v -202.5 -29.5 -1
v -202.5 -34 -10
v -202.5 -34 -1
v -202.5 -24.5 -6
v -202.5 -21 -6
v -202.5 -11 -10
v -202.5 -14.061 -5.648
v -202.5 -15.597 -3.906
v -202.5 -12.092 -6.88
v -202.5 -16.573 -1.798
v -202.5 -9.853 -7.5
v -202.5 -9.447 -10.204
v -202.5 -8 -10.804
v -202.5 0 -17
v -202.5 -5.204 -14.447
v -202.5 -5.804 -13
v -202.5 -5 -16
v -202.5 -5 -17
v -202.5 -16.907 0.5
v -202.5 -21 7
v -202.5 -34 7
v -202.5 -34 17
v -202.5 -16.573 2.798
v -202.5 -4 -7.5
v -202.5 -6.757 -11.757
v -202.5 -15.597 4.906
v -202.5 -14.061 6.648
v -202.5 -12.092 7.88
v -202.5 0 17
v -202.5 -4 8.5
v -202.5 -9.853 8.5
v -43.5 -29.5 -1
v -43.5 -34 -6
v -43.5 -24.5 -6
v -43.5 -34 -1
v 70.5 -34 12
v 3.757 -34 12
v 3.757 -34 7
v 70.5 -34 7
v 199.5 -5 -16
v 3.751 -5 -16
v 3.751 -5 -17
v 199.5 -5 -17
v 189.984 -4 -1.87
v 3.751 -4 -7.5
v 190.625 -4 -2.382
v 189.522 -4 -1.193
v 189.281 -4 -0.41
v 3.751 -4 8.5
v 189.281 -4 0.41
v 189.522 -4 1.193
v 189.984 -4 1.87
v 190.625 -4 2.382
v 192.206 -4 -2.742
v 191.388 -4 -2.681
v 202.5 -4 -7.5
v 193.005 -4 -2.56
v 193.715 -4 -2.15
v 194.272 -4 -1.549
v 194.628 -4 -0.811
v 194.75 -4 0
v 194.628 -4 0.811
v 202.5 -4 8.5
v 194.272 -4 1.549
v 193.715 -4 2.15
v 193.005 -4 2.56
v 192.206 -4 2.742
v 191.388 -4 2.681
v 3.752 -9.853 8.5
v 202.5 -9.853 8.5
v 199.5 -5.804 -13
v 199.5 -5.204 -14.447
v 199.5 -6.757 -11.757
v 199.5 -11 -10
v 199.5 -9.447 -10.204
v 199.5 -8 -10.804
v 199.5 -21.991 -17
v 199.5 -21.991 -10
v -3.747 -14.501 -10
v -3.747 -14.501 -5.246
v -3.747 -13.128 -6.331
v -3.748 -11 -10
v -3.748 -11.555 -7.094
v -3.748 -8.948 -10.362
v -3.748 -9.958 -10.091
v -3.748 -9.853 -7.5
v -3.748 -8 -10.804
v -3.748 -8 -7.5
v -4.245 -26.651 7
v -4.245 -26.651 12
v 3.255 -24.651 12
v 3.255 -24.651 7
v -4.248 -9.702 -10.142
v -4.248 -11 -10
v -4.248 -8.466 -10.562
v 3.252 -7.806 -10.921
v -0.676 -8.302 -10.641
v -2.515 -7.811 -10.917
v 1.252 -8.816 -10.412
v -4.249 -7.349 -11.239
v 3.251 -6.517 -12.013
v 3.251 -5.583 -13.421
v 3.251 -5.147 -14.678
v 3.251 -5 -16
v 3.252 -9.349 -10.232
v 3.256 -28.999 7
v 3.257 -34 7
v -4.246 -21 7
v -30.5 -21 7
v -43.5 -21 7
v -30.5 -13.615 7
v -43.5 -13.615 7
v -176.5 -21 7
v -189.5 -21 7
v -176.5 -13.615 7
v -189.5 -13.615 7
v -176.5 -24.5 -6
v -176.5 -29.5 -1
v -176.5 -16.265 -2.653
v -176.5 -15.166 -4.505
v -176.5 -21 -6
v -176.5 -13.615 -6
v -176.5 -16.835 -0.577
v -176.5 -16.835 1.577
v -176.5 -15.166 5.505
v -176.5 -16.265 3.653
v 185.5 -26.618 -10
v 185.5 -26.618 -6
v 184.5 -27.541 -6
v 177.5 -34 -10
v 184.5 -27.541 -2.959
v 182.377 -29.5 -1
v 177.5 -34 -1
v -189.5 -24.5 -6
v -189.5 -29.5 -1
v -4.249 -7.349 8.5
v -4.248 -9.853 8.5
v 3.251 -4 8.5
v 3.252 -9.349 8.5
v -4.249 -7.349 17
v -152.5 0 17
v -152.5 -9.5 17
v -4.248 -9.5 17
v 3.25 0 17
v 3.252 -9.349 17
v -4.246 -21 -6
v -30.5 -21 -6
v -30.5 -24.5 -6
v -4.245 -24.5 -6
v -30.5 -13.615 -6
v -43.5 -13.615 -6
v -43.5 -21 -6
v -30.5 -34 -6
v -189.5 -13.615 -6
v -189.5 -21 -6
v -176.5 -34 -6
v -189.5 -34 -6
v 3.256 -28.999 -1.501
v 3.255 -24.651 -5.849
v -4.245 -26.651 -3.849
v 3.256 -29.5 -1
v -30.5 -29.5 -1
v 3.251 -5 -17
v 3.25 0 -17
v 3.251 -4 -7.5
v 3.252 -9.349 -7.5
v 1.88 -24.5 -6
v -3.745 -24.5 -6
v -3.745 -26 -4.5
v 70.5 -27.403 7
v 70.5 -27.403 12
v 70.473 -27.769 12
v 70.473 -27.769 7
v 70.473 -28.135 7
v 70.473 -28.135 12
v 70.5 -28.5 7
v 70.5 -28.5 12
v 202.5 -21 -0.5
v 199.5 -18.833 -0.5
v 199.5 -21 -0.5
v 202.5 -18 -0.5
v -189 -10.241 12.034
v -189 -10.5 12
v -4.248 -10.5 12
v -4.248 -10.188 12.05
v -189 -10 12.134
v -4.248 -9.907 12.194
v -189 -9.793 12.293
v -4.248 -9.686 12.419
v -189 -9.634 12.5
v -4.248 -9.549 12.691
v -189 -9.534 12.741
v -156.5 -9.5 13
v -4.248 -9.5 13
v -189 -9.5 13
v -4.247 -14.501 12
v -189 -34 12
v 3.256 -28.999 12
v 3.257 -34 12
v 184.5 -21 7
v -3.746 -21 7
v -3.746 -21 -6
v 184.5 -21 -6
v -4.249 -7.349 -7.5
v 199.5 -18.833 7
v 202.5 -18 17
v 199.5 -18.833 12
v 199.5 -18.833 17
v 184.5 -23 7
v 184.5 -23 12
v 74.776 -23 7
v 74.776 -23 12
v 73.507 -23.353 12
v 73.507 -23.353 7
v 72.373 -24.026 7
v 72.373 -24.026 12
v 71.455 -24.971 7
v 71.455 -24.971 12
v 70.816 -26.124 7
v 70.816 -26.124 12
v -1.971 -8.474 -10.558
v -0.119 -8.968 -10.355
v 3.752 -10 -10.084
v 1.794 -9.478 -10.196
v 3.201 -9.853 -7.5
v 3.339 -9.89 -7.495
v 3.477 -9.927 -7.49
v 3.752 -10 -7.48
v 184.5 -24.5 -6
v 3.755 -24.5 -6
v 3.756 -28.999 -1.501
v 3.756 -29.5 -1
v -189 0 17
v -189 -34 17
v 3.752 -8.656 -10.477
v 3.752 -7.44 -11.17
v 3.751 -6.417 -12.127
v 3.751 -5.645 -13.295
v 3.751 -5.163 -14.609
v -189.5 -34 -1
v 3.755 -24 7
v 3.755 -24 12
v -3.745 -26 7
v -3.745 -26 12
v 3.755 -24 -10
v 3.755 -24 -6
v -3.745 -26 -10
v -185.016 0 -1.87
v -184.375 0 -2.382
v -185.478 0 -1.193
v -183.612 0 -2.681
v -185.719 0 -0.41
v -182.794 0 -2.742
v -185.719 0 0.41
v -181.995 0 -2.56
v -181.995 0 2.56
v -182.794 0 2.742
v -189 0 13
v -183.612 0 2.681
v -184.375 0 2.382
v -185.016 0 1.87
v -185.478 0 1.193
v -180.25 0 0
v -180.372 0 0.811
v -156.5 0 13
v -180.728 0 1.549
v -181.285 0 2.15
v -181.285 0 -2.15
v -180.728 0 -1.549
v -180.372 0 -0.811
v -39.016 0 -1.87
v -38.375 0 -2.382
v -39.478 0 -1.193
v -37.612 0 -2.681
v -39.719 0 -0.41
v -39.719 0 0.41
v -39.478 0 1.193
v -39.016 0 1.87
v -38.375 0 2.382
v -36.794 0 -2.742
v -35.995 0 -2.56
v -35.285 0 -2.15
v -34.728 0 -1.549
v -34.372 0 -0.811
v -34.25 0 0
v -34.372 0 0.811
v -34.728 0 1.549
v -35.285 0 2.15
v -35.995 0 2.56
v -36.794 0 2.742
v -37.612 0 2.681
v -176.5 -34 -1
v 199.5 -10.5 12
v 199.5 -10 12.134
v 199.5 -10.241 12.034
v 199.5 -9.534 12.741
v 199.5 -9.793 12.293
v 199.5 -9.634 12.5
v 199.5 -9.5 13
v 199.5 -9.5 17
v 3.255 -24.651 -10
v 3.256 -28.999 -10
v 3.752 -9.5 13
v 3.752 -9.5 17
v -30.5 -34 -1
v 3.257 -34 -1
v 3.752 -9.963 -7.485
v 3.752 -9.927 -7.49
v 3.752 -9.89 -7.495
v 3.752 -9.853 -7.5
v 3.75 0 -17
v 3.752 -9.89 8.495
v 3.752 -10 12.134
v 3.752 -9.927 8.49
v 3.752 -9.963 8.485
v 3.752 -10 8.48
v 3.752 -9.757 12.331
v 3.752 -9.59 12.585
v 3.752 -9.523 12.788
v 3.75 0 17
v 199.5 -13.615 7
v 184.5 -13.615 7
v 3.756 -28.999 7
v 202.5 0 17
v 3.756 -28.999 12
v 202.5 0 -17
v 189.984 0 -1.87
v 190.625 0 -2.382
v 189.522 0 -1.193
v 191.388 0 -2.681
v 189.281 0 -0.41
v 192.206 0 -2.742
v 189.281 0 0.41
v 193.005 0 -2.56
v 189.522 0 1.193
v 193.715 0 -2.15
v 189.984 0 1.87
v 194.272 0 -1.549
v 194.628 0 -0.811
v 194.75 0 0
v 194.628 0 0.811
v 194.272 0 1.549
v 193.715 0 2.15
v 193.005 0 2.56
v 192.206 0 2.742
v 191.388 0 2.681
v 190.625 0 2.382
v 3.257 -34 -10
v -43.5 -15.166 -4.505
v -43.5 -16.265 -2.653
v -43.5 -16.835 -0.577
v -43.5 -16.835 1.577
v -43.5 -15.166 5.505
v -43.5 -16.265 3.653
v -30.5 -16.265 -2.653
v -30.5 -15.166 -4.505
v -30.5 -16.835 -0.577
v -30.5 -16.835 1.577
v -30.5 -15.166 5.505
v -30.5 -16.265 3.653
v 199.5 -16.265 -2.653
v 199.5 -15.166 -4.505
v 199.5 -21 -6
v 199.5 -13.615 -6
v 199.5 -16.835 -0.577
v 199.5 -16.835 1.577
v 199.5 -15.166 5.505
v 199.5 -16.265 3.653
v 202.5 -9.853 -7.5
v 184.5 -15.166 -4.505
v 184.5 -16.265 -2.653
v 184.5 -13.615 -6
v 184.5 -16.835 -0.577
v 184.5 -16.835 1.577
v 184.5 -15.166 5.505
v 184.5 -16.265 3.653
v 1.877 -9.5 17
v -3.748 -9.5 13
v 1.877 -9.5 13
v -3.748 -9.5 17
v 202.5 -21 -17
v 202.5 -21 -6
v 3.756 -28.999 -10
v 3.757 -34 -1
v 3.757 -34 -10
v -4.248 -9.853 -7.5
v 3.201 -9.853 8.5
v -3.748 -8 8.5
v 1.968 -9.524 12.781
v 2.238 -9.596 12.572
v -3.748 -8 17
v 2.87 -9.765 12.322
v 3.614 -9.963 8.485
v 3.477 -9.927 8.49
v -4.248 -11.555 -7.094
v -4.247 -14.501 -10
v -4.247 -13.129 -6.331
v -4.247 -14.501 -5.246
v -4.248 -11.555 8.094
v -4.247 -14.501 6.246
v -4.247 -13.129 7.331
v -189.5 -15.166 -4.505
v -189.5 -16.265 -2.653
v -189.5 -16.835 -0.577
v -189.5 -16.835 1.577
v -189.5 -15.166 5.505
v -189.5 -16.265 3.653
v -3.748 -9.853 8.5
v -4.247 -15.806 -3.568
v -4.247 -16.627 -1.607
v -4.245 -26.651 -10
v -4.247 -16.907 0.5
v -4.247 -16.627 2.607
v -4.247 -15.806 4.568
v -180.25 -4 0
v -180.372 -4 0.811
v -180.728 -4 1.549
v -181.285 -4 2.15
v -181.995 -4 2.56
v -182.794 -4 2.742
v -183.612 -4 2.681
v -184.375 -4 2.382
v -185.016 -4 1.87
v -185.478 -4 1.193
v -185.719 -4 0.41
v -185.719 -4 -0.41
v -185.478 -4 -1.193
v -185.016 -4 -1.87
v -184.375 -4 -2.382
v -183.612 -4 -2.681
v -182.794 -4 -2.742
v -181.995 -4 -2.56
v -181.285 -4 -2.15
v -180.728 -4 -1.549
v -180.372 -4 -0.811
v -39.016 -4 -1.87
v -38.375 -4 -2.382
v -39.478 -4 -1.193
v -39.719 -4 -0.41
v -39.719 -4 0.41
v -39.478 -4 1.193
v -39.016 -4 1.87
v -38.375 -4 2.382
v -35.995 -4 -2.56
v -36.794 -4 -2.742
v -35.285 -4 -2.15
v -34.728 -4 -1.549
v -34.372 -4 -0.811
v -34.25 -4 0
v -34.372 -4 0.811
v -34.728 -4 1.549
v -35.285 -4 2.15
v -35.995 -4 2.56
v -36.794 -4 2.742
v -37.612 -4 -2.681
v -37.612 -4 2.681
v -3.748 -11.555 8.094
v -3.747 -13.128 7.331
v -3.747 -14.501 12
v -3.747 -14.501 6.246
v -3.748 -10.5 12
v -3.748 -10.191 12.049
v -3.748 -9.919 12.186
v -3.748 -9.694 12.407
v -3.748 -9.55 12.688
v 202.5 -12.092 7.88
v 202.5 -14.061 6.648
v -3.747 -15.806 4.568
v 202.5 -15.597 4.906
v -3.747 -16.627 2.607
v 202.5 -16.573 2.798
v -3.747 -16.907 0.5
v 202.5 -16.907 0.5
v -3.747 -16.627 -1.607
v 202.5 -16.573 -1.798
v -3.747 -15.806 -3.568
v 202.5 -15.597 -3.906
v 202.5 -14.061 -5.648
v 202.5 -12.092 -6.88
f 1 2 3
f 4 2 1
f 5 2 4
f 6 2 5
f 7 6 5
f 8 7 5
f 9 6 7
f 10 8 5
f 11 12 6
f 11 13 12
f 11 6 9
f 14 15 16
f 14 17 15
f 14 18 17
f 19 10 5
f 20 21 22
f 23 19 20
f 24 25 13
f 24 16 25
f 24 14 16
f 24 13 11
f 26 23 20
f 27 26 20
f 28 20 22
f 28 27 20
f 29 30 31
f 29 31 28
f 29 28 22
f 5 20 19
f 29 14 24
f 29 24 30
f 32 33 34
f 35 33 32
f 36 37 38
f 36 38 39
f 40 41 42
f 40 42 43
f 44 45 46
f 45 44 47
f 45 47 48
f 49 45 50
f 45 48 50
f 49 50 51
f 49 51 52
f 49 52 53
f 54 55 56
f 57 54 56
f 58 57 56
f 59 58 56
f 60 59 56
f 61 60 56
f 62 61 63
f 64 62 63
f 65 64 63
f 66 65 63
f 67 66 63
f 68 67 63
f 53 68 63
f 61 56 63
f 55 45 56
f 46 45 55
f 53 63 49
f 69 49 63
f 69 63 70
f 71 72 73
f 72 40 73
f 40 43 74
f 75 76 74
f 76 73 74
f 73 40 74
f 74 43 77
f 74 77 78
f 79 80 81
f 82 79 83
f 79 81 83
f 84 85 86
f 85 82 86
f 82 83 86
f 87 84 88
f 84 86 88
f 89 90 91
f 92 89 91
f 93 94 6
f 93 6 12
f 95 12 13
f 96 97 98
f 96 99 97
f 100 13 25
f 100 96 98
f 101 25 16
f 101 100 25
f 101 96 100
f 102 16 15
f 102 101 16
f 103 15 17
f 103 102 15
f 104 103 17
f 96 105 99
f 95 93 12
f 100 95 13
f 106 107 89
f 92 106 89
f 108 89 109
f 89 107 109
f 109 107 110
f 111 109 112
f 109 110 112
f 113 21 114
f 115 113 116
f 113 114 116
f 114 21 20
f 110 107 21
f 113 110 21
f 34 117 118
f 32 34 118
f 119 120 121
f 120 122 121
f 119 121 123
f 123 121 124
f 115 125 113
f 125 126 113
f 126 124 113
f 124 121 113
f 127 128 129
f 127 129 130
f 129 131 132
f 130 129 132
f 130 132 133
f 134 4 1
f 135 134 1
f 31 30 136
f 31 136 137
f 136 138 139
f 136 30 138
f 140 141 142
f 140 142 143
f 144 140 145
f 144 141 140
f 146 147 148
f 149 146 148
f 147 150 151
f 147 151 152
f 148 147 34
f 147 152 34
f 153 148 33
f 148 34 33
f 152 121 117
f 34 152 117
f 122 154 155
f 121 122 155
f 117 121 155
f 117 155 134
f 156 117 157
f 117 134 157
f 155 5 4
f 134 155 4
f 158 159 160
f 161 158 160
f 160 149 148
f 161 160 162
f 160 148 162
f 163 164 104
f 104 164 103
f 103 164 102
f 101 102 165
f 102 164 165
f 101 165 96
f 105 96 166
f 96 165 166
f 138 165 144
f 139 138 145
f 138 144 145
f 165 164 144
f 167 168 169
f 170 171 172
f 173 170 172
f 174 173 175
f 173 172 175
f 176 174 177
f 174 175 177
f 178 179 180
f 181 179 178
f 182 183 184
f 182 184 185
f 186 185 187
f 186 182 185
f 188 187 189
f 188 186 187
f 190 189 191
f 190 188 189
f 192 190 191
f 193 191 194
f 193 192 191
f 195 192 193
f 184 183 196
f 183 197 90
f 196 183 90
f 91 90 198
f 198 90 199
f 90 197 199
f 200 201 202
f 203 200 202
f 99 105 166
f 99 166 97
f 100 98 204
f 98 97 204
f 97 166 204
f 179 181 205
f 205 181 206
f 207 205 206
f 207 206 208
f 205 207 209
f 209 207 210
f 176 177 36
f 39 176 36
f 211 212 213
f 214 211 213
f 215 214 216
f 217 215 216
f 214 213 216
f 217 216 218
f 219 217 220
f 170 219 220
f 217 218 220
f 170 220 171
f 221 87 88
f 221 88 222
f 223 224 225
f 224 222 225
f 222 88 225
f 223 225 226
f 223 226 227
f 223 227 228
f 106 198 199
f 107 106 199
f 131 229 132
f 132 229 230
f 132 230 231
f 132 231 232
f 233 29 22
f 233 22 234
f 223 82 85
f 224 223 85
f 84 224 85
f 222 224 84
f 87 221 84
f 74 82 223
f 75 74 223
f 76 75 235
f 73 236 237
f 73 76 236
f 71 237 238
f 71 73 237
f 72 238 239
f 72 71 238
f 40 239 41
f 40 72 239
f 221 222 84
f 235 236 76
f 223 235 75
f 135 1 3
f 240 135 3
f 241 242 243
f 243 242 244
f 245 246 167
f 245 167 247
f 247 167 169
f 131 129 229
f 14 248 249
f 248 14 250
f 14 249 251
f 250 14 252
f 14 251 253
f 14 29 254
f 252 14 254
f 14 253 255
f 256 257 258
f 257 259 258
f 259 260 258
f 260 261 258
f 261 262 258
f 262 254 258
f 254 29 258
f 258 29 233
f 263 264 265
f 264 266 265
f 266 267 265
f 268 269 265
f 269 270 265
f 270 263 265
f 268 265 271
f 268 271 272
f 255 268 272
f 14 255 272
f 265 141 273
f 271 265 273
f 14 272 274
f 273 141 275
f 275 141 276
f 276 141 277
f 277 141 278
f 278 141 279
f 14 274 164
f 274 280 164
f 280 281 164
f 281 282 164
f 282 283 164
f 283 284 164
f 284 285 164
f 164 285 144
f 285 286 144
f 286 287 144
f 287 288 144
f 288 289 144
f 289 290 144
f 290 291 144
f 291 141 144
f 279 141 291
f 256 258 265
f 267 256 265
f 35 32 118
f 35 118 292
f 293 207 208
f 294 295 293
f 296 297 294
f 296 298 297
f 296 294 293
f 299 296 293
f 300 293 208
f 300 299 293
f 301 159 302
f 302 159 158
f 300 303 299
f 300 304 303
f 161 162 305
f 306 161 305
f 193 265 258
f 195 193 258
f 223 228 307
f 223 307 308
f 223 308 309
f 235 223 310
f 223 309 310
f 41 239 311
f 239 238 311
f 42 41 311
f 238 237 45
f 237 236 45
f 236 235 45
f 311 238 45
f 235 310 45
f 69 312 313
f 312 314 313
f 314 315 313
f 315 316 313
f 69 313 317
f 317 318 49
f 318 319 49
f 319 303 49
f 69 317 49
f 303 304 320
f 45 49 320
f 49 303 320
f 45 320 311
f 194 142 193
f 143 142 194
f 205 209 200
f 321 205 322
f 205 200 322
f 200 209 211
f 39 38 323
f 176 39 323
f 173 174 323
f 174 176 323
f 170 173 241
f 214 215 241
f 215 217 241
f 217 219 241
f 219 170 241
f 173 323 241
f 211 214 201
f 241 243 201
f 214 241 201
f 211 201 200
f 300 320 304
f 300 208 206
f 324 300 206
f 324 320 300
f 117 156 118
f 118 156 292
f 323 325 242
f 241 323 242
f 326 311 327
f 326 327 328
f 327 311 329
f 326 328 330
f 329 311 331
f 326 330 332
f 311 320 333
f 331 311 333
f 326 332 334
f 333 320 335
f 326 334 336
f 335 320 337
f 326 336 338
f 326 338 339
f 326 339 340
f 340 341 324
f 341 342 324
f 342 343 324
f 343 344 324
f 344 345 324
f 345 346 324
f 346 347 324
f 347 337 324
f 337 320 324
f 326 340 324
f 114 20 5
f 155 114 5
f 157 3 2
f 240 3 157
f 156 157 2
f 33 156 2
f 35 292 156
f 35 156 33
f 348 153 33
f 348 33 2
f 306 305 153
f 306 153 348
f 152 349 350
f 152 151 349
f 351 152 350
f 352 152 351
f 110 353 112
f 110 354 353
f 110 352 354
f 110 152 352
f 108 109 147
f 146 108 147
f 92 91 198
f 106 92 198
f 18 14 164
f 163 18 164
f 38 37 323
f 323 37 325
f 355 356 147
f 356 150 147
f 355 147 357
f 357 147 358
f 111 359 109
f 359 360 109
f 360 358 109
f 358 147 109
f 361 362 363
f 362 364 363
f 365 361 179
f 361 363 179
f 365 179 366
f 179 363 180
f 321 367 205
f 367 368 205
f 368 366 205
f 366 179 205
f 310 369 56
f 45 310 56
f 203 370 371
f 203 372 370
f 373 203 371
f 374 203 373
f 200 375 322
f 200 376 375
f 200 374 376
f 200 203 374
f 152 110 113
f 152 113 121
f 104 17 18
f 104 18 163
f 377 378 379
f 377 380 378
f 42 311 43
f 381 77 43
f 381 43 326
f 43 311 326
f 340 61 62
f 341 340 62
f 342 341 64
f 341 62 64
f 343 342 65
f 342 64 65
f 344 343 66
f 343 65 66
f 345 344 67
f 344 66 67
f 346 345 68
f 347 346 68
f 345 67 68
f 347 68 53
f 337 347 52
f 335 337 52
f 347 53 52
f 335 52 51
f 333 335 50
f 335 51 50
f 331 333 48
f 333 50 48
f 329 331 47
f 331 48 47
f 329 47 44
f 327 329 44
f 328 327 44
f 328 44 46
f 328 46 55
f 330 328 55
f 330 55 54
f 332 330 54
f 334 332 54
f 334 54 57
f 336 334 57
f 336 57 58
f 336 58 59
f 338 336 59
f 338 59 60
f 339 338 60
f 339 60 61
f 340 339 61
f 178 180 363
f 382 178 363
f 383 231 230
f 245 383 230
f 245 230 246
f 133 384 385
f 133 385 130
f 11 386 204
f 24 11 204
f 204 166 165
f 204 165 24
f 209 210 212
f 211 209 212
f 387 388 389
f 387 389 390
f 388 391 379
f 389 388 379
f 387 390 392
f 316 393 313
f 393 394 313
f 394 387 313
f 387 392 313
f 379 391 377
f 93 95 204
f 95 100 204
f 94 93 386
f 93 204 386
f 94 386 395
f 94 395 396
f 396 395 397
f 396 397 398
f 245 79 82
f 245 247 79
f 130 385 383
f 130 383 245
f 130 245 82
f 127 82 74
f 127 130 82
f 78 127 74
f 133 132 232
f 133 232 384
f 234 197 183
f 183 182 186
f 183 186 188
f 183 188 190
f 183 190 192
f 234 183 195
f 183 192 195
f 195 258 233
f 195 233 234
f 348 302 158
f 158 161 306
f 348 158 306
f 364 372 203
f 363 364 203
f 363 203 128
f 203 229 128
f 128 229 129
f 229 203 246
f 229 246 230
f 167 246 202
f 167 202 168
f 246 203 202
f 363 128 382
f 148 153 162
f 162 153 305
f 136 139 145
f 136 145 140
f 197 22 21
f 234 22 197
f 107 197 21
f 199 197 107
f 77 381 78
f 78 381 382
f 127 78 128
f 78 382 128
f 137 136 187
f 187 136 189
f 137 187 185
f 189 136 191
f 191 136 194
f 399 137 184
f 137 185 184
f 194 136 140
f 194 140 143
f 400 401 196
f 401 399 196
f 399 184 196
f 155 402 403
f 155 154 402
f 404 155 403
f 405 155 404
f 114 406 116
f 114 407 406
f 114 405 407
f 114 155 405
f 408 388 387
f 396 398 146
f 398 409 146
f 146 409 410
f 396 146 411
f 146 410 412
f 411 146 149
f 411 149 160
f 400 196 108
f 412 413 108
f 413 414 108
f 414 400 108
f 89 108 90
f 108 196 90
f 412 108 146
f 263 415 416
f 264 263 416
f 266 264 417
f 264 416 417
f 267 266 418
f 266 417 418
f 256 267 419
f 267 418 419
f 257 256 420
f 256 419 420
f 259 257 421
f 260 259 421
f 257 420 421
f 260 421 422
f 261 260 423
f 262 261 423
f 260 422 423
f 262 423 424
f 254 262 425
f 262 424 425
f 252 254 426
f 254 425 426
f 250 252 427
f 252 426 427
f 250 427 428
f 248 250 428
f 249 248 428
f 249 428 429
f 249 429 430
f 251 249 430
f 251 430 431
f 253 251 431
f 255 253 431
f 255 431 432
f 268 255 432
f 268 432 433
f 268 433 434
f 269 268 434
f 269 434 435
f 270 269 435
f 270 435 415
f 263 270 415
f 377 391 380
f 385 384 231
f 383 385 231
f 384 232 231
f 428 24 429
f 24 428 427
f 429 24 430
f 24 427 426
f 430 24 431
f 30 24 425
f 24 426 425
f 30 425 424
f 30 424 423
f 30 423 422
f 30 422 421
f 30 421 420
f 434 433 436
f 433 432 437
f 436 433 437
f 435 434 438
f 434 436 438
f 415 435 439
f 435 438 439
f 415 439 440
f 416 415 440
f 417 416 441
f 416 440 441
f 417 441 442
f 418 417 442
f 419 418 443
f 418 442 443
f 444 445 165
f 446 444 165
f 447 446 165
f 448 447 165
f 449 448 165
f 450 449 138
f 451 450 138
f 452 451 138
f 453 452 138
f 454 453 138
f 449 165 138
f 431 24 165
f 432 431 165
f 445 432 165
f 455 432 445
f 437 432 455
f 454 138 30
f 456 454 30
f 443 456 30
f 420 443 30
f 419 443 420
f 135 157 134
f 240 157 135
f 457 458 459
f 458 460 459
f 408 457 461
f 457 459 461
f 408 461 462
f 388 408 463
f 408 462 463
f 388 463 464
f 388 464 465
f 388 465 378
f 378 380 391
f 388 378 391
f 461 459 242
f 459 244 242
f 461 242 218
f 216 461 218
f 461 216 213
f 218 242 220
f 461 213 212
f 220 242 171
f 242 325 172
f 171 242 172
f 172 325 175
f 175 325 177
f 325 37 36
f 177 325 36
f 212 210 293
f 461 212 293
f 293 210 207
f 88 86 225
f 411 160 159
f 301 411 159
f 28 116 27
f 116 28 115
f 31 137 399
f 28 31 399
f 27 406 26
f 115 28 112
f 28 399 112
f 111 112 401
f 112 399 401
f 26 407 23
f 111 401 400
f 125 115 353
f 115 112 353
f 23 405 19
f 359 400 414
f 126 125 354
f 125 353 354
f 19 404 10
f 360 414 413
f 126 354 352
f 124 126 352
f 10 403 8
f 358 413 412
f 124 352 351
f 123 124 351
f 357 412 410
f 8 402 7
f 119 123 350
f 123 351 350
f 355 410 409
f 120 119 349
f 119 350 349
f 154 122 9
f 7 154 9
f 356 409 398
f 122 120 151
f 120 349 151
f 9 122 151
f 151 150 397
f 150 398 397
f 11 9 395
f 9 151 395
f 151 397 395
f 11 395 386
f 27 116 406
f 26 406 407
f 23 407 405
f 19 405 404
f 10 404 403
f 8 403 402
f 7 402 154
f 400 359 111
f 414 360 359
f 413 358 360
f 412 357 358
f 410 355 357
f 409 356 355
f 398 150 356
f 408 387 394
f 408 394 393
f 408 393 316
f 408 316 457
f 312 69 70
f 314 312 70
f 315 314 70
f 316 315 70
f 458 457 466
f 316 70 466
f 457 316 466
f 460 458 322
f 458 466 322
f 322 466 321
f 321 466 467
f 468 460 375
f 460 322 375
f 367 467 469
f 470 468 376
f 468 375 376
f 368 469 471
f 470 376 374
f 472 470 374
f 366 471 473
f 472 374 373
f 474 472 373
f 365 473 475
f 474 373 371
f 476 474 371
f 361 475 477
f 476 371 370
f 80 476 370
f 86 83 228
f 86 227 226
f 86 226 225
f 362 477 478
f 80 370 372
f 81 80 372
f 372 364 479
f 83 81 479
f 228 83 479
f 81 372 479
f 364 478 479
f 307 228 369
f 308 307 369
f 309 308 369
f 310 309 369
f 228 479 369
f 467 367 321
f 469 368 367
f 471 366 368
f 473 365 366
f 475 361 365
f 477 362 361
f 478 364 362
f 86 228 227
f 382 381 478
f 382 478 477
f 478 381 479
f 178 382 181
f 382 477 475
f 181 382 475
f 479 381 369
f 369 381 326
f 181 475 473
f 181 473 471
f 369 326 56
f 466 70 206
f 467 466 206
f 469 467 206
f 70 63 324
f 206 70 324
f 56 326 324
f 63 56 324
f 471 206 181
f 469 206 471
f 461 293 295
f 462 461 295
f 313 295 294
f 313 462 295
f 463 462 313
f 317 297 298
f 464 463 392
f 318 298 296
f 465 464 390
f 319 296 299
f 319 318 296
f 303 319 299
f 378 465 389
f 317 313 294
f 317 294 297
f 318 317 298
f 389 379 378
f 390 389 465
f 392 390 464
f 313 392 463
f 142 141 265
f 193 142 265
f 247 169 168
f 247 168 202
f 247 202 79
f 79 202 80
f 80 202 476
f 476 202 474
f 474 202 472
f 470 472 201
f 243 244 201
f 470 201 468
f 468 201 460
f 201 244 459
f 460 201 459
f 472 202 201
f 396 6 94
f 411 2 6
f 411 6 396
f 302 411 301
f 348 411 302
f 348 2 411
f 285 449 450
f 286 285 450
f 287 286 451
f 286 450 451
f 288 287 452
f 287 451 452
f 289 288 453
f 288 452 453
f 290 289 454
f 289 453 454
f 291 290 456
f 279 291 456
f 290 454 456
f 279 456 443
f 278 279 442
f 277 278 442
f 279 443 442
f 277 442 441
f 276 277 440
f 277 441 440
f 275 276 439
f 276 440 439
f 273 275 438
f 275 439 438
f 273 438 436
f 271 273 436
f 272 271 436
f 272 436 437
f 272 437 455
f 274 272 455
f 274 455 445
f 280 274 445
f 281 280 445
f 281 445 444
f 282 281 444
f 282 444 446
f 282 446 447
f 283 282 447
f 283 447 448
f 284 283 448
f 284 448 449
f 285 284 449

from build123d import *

# Parameters (mm, degrees)
F0_W      = 405
F0_H      = 34
F1_DEPTH  = 34
F2_W      = 402
F2_H      = 7
F3_DEPTH  = 29
F4_W      = 382
F4_H      = 5
F5_DEPTH  = 24.5
F6_R      = 6
F8_DEPTH  = 405.001
F10_DEPTH = 34.001
F11_W     = 13
F11_H     = 13
F12_DEPTH = 30
F13_R     = 2.75
F14_DEPTH = 4.001
F15_W     = 13
F15_H     = 13
F16_DEPTH = 29
F17_R     = 2.75
F18_DEPTH = 5.001
F19_W     = 15
F19_H     = 13
F20_DEPTH = 29
F21_R     = 2.75
F22_DEPTH = 5.001
F24_DEPTH = 12.5
F26_DEPTH = 25
F27_W     = 6.5
F27_H     = 5
F28_DEPTH = 25
F29_R     = 1
F31_DEPTH = 405.001
F33_DEPTH = 17.5


with BuildPart() as f1:
    # F0 (on Front) → F1 (new body)
    with BuildSketch(Plane.XZ):
        Rectangle(F0_W, F0_H)
    extrude(amount=F1_DEPTH)

    # F2 (on face) → F3 (cut)
    with BuildSketch(Plane.XZ.offset(34)):
        with Locations((-1.5, -13.5)):
            Rectangle(F2_W, F2_H)
    extrude(amount=-F3_DEPTH, mode=Mode.SUBTRACT)

    # F4 (on face) → F5 (cut)
    with BuildSketch(Plane.XZ.offset(34)):
        with Locations((2, 14.5)):
            Rectangle(F4_W, F4_H)
    extrude(amount=-F5_DEPTH, mode=Mode.SUBTRACT)

    # F6
    f6_edges = [f1.edges().sort_by_distance(p)[0] for p in [
        (-1.5, -5, -10),
    ]]
    fillet(f6_edges, radius=F6_R)

    # F7 (on face) → F8 (cut, through all)
    with BuildSketch(Plane(origin=(-202.5, 0, 0), x_dir=(0, -1, 0), z_dir=(-1, 0, 0))):
        Polygon((34, -1), (34, 7), (21, 7), (21, -6), (24.5, -6), (29.5, -1), align=None)
    extrude(amount=-F8_DEPTH, mode=Mode.SUBTRACT)

    # F9 (on face) → F10 (cut, through all)
    with BuildSketch(Plane(origin=(0, 0, 0), x_dir=(-1, 0, 0), z_dir=(0, 1, 0))):
        Polygon((189, 13), (189, 17), (155.211314559, 17), (152.5, 17), (156.5, 13), align=None)
    extrude(amount=-F10_DEPTH, mode=Mode.SUBTRACT)

    # F11 (on face) → F12 (cut)
    with BuildSketch(Plane.XZ.offset(34)):
        with Locations((-183, 0.5)):
            Rectangle(F11_W, F11_H)
    extrude(amount=-F12_DEPTH, mode=Mode.SUBTRACT)

    # F13 (on face) → F14 (cut, through all)
    with BuildSketch(Plane.XZ.offset(4)):
        with Locations((-183, 0)):
            Circle(F13_R)
    extrude(amount=-F14_DEPTH, mode=Mode.SUBTRACT)

    # F15 (on face) → F16 (cut)
    with BuildSketch(Plane.XZ.offset(34)):
        with Locations((-37, 0.5)):
            Rectangle(F15_W, F15_H)
    extrude(amount=-F16_DEPTH, mode=Mode.SUBTRACT)

    # F17 (on face) → F18 (cut, through all)
    with BuildSketch(Plane.XZ.offset(5)):
        with Locations((-37, 0)):
            Circle(F17_R)
    extrude(amount=-F18_DEPTH, mode=Mode.SUBTRACT)

    # F19 (on face) → F20 (cut)
    with BuildSketch(Plane.XZ.offset(34)):
        with Locations((192, 0.5)):
            Rectangle(F19_W, F19_H)
    extrude(amount=-F20_DEPTH, mode=Mode.SUBTRACT)

    # F21 (on face) → F22 (cut, through all)
    with BuildSketch(Plane.XZ.offset(5)):
        with Locations((192, 0)):
            Circle(F21_R)
    extrude(amount=-F22_DEPTH, mode=Mode.SUBTRACT)

    # F23 (on face) → F24 (cut, symmetric)
    with BuildSketch(Plane.XY.offset(12)):
        with BuildLine():
            Line((70.5, -28.5), (70.5, -34))
            Line((70.5, -34), (202.5, -34))
            Line((202.5, -34), (202.5, -18))
            Line((202.5, -18), (184.5, -23))
            Line((184.5, -23), (74.7762184258, -23))
            ThreePointArc((74.7762184258, -23), (71.8829216759, -24.4682643392), (70.5, -27.4033101466))
            Line((70.5, -27.4033101466), (70.5, -28.5))
        make_face()
        with BuildLine():
            ThreePointArc((70.5, -27.4033101466), (70.4698408266, -27.9516550733), (70.5, -28.5))
            Line((70.5, -28.5), (70.5, -27.4033101466))
        make_face()
    extrude(amount=F24_DEPTH, both=True, mode=Mode.SUBTRACT)

    # F25 (on face) → F26 (cut)
    with BuildSketch(Plane.XY.offset(-1)):
        Polygon((185.5, -26.6178918779), (177.5, -34), (202.5, -34), (202.5, -21), align=None)
    extrude(amount=-F26_DEPTH, mode=Mode.SUBTRACT)

    # F27 (on face) → F28 (cut)
    with BuildSketch(Plane.XZ.offset(9.5)):
        with Locations((196.25, 14.5)):
            Rectangle(F27_W, F27_H)
    extrude(amount=F28_DEPTH, mode=Mode.SUBTRACT)

    # F29
    f29_edges = [f1.edges().sort_by_distance(p)[0] for p in [
        (5.25, -9.5, 12),
    ]]
    fillet(f29_edges, radius=F29_R)

    # F30 (on face) → F31 (cut, through all)
    with BuildSketch(Plane.YZ.offset(202.5)):
        with BuildLine():
            Line((-4, -7.5), (-4, -6))
            Line((-4, -6), (-4, 7))
            Line((-4, 7), (-4, 8.5))
            Line((-4, 8.5), (-9.8530706018, 8.5))
            ThreePointArc((-9.8530706018, 8.5), (-16.9070794038, 0.5), (-9.8530706018, -7.5))
            Line((-9.8530706018, -7.5), (-4, -7.5))
        make_face()
    extrude(amount=-F31_DEPTH, mode=Mode.SUBTRACT)

    # F32 (on Top) → F33 (cut, symmetric)
    with BuildSketch(Plane.XY):
        Polygon((3.7548480159, -24), (-3.7447481422, -26), (-3.7470709602, -14.5007571947), (-4.24707095, -14.5008581934), (-4.2446166965, -26.650779799), (3.2549794615, -24.650779799), (3.2558578603, -28.9993429166), (3.7558578501, -28.9992419178), align=None)
        Polygon((-4.24707095, -14.5008581934), (-3.7470709602, -14.5007571947), (-3.7483840967, -8), (3.7520200512, -10), (3.7500000765, 0), (3.2500000663, 0), (3.2518885746, -9.3491681538), (-4.2485155733, -7.3491681538), align=None)
        Polygon((3.7568679906, -34), (3.7558578501, -28.9992419178), (3.2558578603, -28.9993429166), (3.2568679804, -34), align=None)
    extrude(amount=F33_DEPTH, both=True, mode=Mode.SUBTRACT)


solid = f1.part
